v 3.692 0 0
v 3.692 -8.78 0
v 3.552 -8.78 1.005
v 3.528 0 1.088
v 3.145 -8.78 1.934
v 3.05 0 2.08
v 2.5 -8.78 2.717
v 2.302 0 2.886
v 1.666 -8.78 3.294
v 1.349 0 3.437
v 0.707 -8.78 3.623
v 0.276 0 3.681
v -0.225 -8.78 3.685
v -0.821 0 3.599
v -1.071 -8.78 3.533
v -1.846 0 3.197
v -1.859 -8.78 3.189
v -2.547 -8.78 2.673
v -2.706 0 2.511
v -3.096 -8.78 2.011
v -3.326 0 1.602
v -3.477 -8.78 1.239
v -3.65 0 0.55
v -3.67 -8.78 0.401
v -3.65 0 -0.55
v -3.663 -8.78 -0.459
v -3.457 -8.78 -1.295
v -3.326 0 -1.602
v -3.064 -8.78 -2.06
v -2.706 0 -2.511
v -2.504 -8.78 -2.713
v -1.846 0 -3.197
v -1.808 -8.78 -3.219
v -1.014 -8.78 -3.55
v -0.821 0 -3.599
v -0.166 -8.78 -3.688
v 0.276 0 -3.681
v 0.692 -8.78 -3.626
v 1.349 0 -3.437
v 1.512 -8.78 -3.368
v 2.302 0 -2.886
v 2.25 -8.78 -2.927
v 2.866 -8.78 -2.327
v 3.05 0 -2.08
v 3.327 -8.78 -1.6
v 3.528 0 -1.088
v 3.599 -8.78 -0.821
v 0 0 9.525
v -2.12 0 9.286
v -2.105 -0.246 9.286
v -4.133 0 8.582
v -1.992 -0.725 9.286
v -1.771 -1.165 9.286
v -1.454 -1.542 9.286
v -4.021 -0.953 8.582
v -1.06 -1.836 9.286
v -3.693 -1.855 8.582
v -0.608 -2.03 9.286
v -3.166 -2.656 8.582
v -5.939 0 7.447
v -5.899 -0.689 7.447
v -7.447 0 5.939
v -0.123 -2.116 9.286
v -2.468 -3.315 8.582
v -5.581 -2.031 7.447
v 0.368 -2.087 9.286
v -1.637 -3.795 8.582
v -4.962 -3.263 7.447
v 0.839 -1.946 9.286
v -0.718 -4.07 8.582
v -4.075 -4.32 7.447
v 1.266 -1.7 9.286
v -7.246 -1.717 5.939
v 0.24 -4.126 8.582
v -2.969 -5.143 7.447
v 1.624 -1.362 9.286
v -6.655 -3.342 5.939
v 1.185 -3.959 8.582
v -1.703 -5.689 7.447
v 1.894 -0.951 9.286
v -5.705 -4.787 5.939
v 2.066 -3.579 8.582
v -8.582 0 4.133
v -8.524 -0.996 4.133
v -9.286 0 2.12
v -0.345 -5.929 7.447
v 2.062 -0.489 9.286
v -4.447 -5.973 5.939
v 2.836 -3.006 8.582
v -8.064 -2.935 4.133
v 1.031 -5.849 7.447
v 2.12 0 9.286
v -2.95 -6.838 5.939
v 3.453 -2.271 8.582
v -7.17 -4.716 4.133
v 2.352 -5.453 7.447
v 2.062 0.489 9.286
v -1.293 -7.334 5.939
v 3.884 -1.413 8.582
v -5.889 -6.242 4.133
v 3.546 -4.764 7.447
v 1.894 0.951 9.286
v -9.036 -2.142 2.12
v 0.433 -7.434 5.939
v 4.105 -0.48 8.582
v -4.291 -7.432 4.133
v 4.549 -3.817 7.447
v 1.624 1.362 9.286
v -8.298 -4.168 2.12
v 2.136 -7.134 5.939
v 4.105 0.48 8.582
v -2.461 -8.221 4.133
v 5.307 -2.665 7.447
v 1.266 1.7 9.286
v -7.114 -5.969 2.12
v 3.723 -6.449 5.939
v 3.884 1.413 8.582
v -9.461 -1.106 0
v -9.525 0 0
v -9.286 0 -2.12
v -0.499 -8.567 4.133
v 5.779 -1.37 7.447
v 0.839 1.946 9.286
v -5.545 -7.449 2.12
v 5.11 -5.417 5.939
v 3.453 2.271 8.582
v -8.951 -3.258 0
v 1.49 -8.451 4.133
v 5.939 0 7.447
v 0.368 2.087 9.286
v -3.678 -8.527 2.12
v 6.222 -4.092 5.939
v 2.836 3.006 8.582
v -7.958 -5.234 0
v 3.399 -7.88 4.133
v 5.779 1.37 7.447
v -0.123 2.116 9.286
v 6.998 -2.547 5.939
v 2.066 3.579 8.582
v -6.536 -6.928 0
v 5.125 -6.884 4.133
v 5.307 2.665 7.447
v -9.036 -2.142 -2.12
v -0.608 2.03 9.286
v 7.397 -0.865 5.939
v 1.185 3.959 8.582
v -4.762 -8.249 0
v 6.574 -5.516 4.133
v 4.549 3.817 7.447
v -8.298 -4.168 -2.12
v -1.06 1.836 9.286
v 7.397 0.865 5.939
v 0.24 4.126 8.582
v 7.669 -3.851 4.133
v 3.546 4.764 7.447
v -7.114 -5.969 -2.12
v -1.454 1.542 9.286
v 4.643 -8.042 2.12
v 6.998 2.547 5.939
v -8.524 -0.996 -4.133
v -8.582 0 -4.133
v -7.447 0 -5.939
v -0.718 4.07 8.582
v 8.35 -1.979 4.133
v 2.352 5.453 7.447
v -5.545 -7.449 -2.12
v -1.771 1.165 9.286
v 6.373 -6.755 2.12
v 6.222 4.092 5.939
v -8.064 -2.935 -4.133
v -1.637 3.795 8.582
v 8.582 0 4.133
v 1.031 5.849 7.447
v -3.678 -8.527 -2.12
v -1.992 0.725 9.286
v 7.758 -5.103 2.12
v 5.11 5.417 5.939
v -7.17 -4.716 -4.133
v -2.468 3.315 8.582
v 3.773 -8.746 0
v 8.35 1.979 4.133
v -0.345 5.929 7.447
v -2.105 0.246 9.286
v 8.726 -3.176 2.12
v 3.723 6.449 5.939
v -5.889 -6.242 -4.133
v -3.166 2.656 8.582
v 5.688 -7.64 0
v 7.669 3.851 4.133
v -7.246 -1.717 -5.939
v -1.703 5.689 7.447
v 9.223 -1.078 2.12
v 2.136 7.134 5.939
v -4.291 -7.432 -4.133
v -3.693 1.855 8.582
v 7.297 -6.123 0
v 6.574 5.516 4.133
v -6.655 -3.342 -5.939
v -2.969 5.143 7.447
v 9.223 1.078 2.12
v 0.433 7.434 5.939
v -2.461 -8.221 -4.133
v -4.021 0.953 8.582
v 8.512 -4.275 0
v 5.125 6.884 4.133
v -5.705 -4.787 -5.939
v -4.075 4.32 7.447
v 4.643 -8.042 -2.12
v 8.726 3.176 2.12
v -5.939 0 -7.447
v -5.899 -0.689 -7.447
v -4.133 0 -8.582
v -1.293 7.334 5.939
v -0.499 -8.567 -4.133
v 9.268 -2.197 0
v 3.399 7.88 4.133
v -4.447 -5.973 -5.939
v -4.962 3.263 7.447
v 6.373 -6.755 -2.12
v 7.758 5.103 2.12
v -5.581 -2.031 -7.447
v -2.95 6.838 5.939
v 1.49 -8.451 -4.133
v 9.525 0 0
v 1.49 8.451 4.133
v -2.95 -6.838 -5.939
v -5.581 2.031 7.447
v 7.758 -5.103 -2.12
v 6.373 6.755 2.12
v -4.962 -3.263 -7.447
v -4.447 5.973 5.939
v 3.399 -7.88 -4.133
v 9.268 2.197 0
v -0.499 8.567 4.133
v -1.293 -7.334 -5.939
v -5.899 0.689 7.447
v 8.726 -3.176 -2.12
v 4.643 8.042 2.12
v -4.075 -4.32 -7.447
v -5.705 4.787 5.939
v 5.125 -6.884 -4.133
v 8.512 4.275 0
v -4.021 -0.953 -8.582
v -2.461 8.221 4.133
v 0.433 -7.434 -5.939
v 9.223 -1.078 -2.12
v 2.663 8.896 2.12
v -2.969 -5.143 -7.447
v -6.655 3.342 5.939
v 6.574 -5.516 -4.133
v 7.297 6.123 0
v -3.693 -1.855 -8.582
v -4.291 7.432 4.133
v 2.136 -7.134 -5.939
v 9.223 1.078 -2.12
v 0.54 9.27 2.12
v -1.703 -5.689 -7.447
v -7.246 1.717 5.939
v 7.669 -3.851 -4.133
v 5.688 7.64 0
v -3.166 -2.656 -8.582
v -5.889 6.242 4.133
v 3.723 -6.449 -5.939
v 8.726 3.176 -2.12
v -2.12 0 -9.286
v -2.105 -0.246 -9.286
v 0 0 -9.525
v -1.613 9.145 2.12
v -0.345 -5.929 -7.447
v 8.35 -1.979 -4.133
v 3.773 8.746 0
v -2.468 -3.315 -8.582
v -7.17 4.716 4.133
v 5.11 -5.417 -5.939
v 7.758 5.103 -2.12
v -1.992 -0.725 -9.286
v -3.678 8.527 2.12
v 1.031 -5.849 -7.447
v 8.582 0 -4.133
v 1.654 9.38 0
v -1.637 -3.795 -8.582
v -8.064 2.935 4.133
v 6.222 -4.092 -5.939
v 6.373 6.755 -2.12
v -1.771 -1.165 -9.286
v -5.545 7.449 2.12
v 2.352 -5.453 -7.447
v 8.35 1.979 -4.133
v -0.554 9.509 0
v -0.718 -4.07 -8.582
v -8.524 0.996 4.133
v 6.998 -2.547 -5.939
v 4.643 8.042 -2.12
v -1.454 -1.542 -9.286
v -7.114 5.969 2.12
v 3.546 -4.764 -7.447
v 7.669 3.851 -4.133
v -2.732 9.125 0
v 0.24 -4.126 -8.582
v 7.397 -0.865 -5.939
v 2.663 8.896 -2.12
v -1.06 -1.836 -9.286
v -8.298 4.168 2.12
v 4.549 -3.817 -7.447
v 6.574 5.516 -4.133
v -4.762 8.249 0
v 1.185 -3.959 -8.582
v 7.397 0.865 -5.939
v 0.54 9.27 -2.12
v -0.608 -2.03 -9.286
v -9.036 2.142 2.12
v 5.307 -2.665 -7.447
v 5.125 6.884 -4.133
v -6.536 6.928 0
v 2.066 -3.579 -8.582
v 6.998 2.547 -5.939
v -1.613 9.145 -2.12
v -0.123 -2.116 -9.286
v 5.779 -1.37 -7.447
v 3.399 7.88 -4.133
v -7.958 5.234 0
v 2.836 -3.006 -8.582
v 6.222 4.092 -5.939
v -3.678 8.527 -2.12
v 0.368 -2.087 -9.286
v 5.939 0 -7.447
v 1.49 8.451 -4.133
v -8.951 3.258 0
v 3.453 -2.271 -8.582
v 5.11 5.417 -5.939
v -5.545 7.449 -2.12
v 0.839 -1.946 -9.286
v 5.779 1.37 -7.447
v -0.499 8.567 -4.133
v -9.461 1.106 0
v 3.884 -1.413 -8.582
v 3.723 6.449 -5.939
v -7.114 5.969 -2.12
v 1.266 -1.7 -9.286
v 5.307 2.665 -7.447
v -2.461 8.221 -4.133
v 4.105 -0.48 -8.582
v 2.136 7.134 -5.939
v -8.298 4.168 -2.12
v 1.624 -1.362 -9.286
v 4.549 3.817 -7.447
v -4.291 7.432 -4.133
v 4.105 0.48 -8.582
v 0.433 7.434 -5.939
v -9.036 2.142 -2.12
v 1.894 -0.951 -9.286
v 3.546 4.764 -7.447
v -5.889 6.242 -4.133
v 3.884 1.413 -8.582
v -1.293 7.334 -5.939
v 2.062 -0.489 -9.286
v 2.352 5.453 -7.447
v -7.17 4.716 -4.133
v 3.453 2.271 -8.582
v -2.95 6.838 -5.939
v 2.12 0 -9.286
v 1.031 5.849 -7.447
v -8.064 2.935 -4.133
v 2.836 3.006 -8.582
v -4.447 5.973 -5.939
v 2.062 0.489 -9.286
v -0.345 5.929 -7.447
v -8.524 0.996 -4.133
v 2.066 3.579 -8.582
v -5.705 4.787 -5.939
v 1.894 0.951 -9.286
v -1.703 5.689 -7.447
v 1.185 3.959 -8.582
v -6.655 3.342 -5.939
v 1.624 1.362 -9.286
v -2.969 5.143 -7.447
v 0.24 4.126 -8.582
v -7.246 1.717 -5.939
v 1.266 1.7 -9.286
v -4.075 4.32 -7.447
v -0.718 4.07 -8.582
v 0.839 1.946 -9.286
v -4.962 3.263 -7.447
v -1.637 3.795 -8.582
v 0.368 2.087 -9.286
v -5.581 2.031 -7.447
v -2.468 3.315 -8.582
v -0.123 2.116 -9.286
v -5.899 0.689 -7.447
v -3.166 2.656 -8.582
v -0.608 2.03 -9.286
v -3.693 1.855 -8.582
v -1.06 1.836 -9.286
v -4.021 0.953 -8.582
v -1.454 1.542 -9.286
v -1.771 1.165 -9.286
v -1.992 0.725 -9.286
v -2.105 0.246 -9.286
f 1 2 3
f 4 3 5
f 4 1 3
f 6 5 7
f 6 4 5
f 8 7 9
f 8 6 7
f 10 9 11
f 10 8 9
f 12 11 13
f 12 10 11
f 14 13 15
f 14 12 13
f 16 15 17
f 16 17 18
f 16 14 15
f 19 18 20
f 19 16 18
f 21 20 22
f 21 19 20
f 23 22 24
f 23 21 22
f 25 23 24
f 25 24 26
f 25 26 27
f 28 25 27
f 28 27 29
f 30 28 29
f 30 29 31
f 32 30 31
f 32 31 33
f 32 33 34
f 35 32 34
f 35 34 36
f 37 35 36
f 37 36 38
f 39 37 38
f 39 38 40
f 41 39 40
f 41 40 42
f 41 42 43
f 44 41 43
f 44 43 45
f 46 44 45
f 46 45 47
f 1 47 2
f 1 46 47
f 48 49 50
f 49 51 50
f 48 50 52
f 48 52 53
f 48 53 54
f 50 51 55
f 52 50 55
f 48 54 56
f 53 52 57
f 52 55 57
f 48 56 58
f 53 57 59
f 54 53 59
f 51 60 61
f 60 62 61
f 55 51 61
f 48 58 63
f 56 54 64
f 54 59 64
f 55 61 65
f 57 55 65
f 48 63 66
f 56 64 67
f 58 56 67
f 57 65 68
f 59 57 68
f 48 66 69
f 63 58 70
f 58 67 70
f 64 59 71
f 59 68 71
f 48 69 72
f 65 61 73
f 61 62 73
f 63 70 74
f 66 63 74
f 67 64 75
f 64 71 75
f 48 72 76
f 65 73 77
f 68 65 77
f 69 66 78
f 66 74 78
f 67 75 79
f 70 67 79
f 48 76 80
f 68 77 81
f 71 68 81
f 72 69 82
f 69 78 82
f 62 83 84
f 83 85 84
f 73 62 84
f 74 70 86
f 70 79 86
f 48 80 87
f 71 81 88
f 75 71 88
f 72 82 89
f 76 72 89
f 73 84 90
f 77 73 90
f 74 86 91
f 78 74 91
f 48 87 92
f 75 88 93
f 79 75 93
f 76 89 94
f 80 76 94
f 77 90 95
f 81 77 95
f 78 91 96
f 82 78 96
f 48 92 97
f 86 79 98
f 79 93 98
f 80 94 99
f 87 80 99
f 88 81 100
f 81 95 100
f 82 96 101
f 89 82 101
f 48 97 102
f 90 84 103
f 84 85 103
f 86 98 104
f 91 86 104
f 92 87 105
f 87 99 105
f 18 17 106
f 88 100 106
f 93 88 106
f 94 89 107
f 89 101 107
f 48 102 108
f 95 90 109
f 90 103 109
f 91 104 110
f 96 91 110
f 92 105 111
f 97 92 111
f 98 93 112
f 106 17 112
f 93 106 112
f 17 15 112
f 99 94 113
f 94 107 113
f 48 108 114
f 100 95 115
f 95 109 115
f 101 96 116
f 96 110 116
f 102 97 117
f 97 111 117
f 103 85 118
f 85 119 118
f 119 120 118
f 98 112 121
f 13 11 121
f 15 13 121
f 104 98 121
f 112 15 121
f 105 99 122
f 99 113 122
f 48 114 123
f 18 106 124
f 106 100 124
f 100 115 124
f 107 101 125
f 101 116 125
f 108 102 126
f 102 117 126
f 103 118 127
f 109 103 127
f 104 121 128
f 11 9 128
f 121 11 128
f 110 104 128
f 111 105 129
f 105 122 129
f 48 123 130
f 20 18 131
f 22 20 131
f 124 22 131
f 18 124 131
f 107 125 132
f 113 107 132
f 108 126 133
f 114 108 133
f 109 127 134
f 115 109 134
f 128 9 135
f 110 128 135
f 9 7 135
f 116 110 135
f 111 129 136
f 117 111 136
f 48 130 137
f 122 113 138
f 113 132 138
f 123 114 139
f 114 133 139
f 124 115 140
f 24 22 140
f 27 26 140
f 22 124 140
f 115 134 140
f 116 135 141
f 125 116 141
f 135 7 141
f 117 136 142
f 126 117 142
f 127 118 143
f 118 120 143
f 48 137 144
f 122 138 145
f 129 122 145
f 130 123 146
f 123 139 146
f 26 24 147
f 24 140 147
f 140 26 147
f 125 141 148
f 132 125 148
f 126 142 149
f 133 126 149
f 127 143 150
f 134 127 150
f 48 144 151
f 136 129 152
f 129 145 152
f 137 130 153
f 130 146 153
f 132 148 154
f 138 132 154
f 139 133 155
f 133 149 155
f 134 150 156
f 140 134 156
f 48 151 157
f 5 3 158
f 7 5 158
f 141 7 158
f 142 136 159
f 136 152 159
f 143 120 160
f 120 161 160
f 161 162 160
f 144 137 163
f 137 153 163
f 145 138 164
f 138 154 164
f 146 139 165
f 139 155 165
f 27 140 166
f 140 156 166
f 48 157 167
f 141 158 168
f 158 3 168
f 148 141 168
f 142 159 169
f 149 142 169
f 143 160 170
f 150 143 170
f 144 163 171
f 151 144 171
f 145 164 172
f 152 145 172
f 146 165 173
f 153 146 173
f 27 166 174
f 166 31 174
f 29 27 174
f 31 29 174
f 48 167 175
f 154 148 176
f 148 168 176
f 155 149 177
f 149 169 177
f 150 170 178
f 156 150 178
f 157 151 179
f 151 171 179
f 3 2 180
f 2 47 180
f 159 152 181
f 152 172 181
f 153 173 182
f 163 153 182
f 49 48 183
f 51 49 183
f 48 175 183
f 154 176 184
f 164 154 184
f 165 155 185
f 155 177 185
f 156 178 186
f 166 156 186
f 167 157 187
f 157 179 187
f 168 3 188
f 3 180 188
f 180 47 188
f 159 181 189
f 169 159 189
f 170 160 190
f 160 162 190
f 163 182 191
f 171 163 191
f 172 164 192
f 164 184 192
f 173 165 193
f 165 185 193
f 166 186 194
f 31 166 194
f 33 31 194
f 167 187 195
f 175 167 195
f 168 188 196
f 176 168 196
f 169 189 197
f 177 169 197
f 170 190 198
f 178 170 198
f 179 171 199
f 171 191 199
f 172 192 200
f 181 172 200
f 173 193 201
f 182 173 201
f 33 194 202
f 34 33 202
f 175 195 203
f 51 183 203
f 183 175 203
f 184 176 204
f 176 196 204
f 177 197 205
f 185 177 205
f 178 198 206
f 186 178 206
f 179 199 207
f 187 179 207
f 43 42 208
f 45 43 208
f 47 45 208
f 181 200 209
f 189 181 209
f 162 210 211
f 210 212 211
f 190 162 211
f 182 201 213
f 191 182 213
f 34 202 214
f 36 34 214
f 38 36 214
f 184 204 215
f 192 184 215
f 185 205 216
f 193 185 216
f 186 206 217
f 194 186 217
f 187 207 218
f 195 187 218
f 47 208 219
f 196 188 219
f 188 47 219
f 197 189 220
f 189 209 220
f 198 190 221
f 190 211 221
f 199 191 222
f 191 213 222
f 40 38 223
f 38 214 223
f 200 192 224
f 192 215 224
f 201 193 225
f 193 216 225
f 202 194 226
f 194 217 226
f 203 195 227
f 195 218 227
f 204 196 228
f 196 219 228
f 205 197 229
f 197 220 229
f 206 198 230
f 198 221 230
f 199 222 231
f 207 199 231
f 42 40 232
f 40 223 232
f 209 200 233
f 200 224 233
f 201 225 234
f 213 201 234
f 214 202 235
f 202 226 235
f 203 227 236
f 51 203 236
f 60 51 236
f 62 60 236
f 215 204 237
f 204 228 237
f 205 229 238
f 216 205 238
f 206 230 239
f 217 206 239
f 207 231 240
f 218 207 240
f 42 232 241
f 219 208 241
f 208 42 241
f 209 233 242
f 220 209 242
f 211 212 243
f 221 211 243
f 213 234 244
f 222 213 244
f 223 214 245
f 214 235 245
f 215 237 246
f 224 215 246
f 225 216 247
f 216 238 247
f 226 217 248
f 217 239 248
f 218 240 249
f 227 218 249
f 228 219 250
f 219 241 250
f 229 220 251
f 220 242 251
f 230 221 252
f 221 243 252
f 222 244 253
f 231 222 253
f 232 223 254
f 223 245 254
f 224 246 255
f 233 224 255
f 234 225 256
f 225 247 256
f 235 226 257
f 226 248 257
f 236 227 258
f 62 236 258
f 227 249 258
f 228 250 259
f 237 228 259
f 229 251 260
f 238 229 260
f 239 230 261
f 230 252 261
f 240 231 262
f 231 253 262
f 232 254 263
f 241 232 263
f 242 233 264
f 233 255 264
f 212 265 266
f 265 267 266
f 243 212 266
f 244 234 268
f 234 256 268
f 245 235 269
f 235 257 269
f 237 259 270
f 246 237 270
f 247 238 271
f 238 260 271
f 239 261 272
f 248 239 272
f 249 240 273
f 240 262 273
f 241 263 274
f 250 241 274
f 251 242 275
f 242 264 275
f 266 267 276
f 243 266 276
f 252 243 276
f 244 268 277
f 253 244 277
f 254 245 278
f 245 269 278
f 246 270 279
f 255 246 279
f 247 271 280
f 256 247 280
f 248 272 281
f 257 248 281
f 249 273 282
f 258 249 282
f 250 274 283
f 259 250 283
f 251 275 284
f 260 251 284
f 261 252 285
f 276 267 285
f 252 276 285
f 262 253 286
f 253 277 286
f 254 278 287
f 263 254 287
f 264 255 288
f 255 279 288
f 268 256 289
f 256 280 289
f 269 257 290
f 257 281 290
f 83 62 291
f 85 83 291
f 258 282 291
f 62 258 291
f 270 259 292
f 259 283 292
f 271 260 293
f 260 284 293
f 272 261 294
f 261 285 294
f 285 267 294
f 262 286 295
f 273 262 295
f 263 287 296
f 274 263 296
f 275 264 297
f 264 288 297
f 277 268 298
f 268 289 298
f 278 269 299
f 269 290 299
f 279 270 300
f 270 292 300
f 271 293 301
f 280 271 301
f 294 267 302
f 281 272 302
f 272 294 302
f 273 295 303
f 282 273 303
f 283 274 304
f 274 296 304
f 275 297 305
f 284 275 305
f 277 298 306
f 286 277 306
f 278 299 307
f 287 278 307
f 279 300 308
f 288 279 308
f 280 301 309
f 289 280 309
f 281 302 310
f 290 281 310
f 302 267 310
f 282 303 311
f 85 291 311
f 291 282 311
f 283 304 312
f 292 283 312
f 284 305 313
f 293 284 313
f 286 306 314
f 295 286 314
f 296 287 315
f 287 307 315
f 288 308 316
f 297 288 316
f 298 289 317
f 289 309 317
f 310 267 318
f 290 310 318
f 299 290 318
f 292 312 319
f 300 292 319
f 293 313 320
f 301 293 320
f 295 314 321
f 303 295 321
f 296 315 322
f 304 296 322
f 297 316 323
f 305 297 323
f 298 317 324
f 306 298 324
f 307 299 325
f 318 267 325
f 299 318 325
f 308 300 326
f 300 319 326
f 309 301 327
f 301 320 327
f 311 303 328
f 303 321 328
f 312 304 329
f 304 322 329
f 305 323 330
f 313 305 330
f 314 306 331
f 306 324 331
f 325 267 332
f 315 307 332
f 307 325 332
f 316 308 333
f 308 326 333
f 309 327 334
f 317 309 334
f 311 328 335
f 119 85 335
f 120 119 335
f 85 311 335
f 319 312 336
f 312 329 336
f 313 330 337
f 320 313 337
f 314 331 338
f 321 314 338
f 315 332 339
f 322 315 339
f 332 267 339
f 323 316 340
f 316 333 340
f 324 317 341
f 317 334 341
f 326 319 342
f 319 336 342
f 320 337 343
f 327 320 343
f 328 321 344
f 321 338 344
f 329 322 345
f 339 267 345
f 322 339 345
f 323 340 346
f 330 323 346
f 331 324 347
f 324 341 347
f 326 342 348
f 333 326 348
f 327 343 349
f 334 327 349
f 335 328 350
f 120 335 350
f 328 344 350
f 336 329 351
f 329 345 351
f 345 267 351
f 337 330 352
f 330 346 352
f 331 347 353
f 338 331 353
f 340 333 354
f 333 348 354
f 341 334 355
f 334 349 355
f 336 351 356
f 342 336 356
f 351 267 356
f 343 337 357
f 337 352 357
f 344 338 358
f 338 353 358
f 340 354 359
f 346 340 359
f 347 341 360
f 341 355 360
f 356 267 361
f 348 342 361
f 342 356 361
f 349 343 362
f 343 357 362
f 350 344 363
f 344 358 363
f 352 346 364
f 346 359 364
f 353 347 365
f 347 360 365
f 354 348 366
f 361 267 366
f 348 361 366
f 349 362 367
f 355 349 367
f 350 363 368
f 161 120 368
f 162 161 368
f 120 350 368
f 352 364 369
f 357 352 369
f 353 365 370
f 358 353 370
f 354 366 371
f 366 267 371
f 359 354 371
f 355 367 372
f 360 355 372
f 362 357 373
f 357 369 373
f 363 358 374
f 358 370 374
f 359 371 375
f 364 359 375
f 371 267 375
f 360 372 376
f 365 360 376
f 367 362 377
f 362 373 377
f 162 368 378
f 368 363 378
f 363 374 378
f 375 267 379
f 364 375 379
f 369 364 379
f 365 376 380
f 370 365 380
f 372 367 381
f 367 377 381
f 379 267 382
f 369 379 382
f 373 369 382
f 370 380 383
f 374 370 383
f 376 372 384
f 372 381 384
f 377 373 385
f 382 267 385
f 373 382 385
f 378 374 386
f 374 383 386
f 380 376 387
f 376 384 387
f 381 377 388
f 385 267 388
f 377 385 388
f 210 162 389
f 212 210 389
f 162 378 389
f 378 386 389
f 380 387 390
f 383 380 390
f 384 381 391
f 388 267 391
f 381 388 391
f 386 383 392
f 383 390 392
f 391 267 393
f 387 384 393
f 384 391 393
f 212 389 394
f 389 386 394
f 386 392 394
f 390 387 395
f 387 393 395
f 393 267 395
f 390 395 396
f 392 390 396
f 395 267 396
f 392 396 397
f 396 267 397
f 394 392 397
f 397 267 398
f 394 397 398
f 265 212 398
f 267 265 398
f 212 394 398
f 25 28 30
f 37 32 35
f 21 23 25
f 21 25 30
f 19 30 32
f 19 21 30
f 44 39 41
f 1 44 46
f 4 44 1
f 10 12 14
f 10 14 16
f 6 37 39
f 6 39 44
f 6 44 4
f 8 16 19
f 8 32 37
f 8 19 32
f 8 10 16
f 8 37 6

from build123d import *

# Parameters (mm, degrees)
F3_R     = 3.6917022886
F4_DEPTH = 25.4


with BuildPart() as f2:
    # F0 (on Front) → F2 (revolve)
    with BuildSketch(Plane.XZ):
        with BuildLine():
            Line((0, -9.525), (0, 9.525))
            ThreePointArc((0, 9.525), (-9.525, 0), (0, -9.525))
        make_face()
    revolve(axis=Axis((0, 0, 0), (0, 0, 1)))


with BuildPart() as f4:
    # F3 (on Front) → F4 (new body)
    with BuildSketch(Plane.XZ):
        Circle(F3_R)
    extrude(amount=F4_DEPTH)


with BuildPart() as f2_1:
    add(f2.part)

    # F5: cut F4
    add(f4.part, mode=Mode.SUBTRACT)


solid = f2_1.part
